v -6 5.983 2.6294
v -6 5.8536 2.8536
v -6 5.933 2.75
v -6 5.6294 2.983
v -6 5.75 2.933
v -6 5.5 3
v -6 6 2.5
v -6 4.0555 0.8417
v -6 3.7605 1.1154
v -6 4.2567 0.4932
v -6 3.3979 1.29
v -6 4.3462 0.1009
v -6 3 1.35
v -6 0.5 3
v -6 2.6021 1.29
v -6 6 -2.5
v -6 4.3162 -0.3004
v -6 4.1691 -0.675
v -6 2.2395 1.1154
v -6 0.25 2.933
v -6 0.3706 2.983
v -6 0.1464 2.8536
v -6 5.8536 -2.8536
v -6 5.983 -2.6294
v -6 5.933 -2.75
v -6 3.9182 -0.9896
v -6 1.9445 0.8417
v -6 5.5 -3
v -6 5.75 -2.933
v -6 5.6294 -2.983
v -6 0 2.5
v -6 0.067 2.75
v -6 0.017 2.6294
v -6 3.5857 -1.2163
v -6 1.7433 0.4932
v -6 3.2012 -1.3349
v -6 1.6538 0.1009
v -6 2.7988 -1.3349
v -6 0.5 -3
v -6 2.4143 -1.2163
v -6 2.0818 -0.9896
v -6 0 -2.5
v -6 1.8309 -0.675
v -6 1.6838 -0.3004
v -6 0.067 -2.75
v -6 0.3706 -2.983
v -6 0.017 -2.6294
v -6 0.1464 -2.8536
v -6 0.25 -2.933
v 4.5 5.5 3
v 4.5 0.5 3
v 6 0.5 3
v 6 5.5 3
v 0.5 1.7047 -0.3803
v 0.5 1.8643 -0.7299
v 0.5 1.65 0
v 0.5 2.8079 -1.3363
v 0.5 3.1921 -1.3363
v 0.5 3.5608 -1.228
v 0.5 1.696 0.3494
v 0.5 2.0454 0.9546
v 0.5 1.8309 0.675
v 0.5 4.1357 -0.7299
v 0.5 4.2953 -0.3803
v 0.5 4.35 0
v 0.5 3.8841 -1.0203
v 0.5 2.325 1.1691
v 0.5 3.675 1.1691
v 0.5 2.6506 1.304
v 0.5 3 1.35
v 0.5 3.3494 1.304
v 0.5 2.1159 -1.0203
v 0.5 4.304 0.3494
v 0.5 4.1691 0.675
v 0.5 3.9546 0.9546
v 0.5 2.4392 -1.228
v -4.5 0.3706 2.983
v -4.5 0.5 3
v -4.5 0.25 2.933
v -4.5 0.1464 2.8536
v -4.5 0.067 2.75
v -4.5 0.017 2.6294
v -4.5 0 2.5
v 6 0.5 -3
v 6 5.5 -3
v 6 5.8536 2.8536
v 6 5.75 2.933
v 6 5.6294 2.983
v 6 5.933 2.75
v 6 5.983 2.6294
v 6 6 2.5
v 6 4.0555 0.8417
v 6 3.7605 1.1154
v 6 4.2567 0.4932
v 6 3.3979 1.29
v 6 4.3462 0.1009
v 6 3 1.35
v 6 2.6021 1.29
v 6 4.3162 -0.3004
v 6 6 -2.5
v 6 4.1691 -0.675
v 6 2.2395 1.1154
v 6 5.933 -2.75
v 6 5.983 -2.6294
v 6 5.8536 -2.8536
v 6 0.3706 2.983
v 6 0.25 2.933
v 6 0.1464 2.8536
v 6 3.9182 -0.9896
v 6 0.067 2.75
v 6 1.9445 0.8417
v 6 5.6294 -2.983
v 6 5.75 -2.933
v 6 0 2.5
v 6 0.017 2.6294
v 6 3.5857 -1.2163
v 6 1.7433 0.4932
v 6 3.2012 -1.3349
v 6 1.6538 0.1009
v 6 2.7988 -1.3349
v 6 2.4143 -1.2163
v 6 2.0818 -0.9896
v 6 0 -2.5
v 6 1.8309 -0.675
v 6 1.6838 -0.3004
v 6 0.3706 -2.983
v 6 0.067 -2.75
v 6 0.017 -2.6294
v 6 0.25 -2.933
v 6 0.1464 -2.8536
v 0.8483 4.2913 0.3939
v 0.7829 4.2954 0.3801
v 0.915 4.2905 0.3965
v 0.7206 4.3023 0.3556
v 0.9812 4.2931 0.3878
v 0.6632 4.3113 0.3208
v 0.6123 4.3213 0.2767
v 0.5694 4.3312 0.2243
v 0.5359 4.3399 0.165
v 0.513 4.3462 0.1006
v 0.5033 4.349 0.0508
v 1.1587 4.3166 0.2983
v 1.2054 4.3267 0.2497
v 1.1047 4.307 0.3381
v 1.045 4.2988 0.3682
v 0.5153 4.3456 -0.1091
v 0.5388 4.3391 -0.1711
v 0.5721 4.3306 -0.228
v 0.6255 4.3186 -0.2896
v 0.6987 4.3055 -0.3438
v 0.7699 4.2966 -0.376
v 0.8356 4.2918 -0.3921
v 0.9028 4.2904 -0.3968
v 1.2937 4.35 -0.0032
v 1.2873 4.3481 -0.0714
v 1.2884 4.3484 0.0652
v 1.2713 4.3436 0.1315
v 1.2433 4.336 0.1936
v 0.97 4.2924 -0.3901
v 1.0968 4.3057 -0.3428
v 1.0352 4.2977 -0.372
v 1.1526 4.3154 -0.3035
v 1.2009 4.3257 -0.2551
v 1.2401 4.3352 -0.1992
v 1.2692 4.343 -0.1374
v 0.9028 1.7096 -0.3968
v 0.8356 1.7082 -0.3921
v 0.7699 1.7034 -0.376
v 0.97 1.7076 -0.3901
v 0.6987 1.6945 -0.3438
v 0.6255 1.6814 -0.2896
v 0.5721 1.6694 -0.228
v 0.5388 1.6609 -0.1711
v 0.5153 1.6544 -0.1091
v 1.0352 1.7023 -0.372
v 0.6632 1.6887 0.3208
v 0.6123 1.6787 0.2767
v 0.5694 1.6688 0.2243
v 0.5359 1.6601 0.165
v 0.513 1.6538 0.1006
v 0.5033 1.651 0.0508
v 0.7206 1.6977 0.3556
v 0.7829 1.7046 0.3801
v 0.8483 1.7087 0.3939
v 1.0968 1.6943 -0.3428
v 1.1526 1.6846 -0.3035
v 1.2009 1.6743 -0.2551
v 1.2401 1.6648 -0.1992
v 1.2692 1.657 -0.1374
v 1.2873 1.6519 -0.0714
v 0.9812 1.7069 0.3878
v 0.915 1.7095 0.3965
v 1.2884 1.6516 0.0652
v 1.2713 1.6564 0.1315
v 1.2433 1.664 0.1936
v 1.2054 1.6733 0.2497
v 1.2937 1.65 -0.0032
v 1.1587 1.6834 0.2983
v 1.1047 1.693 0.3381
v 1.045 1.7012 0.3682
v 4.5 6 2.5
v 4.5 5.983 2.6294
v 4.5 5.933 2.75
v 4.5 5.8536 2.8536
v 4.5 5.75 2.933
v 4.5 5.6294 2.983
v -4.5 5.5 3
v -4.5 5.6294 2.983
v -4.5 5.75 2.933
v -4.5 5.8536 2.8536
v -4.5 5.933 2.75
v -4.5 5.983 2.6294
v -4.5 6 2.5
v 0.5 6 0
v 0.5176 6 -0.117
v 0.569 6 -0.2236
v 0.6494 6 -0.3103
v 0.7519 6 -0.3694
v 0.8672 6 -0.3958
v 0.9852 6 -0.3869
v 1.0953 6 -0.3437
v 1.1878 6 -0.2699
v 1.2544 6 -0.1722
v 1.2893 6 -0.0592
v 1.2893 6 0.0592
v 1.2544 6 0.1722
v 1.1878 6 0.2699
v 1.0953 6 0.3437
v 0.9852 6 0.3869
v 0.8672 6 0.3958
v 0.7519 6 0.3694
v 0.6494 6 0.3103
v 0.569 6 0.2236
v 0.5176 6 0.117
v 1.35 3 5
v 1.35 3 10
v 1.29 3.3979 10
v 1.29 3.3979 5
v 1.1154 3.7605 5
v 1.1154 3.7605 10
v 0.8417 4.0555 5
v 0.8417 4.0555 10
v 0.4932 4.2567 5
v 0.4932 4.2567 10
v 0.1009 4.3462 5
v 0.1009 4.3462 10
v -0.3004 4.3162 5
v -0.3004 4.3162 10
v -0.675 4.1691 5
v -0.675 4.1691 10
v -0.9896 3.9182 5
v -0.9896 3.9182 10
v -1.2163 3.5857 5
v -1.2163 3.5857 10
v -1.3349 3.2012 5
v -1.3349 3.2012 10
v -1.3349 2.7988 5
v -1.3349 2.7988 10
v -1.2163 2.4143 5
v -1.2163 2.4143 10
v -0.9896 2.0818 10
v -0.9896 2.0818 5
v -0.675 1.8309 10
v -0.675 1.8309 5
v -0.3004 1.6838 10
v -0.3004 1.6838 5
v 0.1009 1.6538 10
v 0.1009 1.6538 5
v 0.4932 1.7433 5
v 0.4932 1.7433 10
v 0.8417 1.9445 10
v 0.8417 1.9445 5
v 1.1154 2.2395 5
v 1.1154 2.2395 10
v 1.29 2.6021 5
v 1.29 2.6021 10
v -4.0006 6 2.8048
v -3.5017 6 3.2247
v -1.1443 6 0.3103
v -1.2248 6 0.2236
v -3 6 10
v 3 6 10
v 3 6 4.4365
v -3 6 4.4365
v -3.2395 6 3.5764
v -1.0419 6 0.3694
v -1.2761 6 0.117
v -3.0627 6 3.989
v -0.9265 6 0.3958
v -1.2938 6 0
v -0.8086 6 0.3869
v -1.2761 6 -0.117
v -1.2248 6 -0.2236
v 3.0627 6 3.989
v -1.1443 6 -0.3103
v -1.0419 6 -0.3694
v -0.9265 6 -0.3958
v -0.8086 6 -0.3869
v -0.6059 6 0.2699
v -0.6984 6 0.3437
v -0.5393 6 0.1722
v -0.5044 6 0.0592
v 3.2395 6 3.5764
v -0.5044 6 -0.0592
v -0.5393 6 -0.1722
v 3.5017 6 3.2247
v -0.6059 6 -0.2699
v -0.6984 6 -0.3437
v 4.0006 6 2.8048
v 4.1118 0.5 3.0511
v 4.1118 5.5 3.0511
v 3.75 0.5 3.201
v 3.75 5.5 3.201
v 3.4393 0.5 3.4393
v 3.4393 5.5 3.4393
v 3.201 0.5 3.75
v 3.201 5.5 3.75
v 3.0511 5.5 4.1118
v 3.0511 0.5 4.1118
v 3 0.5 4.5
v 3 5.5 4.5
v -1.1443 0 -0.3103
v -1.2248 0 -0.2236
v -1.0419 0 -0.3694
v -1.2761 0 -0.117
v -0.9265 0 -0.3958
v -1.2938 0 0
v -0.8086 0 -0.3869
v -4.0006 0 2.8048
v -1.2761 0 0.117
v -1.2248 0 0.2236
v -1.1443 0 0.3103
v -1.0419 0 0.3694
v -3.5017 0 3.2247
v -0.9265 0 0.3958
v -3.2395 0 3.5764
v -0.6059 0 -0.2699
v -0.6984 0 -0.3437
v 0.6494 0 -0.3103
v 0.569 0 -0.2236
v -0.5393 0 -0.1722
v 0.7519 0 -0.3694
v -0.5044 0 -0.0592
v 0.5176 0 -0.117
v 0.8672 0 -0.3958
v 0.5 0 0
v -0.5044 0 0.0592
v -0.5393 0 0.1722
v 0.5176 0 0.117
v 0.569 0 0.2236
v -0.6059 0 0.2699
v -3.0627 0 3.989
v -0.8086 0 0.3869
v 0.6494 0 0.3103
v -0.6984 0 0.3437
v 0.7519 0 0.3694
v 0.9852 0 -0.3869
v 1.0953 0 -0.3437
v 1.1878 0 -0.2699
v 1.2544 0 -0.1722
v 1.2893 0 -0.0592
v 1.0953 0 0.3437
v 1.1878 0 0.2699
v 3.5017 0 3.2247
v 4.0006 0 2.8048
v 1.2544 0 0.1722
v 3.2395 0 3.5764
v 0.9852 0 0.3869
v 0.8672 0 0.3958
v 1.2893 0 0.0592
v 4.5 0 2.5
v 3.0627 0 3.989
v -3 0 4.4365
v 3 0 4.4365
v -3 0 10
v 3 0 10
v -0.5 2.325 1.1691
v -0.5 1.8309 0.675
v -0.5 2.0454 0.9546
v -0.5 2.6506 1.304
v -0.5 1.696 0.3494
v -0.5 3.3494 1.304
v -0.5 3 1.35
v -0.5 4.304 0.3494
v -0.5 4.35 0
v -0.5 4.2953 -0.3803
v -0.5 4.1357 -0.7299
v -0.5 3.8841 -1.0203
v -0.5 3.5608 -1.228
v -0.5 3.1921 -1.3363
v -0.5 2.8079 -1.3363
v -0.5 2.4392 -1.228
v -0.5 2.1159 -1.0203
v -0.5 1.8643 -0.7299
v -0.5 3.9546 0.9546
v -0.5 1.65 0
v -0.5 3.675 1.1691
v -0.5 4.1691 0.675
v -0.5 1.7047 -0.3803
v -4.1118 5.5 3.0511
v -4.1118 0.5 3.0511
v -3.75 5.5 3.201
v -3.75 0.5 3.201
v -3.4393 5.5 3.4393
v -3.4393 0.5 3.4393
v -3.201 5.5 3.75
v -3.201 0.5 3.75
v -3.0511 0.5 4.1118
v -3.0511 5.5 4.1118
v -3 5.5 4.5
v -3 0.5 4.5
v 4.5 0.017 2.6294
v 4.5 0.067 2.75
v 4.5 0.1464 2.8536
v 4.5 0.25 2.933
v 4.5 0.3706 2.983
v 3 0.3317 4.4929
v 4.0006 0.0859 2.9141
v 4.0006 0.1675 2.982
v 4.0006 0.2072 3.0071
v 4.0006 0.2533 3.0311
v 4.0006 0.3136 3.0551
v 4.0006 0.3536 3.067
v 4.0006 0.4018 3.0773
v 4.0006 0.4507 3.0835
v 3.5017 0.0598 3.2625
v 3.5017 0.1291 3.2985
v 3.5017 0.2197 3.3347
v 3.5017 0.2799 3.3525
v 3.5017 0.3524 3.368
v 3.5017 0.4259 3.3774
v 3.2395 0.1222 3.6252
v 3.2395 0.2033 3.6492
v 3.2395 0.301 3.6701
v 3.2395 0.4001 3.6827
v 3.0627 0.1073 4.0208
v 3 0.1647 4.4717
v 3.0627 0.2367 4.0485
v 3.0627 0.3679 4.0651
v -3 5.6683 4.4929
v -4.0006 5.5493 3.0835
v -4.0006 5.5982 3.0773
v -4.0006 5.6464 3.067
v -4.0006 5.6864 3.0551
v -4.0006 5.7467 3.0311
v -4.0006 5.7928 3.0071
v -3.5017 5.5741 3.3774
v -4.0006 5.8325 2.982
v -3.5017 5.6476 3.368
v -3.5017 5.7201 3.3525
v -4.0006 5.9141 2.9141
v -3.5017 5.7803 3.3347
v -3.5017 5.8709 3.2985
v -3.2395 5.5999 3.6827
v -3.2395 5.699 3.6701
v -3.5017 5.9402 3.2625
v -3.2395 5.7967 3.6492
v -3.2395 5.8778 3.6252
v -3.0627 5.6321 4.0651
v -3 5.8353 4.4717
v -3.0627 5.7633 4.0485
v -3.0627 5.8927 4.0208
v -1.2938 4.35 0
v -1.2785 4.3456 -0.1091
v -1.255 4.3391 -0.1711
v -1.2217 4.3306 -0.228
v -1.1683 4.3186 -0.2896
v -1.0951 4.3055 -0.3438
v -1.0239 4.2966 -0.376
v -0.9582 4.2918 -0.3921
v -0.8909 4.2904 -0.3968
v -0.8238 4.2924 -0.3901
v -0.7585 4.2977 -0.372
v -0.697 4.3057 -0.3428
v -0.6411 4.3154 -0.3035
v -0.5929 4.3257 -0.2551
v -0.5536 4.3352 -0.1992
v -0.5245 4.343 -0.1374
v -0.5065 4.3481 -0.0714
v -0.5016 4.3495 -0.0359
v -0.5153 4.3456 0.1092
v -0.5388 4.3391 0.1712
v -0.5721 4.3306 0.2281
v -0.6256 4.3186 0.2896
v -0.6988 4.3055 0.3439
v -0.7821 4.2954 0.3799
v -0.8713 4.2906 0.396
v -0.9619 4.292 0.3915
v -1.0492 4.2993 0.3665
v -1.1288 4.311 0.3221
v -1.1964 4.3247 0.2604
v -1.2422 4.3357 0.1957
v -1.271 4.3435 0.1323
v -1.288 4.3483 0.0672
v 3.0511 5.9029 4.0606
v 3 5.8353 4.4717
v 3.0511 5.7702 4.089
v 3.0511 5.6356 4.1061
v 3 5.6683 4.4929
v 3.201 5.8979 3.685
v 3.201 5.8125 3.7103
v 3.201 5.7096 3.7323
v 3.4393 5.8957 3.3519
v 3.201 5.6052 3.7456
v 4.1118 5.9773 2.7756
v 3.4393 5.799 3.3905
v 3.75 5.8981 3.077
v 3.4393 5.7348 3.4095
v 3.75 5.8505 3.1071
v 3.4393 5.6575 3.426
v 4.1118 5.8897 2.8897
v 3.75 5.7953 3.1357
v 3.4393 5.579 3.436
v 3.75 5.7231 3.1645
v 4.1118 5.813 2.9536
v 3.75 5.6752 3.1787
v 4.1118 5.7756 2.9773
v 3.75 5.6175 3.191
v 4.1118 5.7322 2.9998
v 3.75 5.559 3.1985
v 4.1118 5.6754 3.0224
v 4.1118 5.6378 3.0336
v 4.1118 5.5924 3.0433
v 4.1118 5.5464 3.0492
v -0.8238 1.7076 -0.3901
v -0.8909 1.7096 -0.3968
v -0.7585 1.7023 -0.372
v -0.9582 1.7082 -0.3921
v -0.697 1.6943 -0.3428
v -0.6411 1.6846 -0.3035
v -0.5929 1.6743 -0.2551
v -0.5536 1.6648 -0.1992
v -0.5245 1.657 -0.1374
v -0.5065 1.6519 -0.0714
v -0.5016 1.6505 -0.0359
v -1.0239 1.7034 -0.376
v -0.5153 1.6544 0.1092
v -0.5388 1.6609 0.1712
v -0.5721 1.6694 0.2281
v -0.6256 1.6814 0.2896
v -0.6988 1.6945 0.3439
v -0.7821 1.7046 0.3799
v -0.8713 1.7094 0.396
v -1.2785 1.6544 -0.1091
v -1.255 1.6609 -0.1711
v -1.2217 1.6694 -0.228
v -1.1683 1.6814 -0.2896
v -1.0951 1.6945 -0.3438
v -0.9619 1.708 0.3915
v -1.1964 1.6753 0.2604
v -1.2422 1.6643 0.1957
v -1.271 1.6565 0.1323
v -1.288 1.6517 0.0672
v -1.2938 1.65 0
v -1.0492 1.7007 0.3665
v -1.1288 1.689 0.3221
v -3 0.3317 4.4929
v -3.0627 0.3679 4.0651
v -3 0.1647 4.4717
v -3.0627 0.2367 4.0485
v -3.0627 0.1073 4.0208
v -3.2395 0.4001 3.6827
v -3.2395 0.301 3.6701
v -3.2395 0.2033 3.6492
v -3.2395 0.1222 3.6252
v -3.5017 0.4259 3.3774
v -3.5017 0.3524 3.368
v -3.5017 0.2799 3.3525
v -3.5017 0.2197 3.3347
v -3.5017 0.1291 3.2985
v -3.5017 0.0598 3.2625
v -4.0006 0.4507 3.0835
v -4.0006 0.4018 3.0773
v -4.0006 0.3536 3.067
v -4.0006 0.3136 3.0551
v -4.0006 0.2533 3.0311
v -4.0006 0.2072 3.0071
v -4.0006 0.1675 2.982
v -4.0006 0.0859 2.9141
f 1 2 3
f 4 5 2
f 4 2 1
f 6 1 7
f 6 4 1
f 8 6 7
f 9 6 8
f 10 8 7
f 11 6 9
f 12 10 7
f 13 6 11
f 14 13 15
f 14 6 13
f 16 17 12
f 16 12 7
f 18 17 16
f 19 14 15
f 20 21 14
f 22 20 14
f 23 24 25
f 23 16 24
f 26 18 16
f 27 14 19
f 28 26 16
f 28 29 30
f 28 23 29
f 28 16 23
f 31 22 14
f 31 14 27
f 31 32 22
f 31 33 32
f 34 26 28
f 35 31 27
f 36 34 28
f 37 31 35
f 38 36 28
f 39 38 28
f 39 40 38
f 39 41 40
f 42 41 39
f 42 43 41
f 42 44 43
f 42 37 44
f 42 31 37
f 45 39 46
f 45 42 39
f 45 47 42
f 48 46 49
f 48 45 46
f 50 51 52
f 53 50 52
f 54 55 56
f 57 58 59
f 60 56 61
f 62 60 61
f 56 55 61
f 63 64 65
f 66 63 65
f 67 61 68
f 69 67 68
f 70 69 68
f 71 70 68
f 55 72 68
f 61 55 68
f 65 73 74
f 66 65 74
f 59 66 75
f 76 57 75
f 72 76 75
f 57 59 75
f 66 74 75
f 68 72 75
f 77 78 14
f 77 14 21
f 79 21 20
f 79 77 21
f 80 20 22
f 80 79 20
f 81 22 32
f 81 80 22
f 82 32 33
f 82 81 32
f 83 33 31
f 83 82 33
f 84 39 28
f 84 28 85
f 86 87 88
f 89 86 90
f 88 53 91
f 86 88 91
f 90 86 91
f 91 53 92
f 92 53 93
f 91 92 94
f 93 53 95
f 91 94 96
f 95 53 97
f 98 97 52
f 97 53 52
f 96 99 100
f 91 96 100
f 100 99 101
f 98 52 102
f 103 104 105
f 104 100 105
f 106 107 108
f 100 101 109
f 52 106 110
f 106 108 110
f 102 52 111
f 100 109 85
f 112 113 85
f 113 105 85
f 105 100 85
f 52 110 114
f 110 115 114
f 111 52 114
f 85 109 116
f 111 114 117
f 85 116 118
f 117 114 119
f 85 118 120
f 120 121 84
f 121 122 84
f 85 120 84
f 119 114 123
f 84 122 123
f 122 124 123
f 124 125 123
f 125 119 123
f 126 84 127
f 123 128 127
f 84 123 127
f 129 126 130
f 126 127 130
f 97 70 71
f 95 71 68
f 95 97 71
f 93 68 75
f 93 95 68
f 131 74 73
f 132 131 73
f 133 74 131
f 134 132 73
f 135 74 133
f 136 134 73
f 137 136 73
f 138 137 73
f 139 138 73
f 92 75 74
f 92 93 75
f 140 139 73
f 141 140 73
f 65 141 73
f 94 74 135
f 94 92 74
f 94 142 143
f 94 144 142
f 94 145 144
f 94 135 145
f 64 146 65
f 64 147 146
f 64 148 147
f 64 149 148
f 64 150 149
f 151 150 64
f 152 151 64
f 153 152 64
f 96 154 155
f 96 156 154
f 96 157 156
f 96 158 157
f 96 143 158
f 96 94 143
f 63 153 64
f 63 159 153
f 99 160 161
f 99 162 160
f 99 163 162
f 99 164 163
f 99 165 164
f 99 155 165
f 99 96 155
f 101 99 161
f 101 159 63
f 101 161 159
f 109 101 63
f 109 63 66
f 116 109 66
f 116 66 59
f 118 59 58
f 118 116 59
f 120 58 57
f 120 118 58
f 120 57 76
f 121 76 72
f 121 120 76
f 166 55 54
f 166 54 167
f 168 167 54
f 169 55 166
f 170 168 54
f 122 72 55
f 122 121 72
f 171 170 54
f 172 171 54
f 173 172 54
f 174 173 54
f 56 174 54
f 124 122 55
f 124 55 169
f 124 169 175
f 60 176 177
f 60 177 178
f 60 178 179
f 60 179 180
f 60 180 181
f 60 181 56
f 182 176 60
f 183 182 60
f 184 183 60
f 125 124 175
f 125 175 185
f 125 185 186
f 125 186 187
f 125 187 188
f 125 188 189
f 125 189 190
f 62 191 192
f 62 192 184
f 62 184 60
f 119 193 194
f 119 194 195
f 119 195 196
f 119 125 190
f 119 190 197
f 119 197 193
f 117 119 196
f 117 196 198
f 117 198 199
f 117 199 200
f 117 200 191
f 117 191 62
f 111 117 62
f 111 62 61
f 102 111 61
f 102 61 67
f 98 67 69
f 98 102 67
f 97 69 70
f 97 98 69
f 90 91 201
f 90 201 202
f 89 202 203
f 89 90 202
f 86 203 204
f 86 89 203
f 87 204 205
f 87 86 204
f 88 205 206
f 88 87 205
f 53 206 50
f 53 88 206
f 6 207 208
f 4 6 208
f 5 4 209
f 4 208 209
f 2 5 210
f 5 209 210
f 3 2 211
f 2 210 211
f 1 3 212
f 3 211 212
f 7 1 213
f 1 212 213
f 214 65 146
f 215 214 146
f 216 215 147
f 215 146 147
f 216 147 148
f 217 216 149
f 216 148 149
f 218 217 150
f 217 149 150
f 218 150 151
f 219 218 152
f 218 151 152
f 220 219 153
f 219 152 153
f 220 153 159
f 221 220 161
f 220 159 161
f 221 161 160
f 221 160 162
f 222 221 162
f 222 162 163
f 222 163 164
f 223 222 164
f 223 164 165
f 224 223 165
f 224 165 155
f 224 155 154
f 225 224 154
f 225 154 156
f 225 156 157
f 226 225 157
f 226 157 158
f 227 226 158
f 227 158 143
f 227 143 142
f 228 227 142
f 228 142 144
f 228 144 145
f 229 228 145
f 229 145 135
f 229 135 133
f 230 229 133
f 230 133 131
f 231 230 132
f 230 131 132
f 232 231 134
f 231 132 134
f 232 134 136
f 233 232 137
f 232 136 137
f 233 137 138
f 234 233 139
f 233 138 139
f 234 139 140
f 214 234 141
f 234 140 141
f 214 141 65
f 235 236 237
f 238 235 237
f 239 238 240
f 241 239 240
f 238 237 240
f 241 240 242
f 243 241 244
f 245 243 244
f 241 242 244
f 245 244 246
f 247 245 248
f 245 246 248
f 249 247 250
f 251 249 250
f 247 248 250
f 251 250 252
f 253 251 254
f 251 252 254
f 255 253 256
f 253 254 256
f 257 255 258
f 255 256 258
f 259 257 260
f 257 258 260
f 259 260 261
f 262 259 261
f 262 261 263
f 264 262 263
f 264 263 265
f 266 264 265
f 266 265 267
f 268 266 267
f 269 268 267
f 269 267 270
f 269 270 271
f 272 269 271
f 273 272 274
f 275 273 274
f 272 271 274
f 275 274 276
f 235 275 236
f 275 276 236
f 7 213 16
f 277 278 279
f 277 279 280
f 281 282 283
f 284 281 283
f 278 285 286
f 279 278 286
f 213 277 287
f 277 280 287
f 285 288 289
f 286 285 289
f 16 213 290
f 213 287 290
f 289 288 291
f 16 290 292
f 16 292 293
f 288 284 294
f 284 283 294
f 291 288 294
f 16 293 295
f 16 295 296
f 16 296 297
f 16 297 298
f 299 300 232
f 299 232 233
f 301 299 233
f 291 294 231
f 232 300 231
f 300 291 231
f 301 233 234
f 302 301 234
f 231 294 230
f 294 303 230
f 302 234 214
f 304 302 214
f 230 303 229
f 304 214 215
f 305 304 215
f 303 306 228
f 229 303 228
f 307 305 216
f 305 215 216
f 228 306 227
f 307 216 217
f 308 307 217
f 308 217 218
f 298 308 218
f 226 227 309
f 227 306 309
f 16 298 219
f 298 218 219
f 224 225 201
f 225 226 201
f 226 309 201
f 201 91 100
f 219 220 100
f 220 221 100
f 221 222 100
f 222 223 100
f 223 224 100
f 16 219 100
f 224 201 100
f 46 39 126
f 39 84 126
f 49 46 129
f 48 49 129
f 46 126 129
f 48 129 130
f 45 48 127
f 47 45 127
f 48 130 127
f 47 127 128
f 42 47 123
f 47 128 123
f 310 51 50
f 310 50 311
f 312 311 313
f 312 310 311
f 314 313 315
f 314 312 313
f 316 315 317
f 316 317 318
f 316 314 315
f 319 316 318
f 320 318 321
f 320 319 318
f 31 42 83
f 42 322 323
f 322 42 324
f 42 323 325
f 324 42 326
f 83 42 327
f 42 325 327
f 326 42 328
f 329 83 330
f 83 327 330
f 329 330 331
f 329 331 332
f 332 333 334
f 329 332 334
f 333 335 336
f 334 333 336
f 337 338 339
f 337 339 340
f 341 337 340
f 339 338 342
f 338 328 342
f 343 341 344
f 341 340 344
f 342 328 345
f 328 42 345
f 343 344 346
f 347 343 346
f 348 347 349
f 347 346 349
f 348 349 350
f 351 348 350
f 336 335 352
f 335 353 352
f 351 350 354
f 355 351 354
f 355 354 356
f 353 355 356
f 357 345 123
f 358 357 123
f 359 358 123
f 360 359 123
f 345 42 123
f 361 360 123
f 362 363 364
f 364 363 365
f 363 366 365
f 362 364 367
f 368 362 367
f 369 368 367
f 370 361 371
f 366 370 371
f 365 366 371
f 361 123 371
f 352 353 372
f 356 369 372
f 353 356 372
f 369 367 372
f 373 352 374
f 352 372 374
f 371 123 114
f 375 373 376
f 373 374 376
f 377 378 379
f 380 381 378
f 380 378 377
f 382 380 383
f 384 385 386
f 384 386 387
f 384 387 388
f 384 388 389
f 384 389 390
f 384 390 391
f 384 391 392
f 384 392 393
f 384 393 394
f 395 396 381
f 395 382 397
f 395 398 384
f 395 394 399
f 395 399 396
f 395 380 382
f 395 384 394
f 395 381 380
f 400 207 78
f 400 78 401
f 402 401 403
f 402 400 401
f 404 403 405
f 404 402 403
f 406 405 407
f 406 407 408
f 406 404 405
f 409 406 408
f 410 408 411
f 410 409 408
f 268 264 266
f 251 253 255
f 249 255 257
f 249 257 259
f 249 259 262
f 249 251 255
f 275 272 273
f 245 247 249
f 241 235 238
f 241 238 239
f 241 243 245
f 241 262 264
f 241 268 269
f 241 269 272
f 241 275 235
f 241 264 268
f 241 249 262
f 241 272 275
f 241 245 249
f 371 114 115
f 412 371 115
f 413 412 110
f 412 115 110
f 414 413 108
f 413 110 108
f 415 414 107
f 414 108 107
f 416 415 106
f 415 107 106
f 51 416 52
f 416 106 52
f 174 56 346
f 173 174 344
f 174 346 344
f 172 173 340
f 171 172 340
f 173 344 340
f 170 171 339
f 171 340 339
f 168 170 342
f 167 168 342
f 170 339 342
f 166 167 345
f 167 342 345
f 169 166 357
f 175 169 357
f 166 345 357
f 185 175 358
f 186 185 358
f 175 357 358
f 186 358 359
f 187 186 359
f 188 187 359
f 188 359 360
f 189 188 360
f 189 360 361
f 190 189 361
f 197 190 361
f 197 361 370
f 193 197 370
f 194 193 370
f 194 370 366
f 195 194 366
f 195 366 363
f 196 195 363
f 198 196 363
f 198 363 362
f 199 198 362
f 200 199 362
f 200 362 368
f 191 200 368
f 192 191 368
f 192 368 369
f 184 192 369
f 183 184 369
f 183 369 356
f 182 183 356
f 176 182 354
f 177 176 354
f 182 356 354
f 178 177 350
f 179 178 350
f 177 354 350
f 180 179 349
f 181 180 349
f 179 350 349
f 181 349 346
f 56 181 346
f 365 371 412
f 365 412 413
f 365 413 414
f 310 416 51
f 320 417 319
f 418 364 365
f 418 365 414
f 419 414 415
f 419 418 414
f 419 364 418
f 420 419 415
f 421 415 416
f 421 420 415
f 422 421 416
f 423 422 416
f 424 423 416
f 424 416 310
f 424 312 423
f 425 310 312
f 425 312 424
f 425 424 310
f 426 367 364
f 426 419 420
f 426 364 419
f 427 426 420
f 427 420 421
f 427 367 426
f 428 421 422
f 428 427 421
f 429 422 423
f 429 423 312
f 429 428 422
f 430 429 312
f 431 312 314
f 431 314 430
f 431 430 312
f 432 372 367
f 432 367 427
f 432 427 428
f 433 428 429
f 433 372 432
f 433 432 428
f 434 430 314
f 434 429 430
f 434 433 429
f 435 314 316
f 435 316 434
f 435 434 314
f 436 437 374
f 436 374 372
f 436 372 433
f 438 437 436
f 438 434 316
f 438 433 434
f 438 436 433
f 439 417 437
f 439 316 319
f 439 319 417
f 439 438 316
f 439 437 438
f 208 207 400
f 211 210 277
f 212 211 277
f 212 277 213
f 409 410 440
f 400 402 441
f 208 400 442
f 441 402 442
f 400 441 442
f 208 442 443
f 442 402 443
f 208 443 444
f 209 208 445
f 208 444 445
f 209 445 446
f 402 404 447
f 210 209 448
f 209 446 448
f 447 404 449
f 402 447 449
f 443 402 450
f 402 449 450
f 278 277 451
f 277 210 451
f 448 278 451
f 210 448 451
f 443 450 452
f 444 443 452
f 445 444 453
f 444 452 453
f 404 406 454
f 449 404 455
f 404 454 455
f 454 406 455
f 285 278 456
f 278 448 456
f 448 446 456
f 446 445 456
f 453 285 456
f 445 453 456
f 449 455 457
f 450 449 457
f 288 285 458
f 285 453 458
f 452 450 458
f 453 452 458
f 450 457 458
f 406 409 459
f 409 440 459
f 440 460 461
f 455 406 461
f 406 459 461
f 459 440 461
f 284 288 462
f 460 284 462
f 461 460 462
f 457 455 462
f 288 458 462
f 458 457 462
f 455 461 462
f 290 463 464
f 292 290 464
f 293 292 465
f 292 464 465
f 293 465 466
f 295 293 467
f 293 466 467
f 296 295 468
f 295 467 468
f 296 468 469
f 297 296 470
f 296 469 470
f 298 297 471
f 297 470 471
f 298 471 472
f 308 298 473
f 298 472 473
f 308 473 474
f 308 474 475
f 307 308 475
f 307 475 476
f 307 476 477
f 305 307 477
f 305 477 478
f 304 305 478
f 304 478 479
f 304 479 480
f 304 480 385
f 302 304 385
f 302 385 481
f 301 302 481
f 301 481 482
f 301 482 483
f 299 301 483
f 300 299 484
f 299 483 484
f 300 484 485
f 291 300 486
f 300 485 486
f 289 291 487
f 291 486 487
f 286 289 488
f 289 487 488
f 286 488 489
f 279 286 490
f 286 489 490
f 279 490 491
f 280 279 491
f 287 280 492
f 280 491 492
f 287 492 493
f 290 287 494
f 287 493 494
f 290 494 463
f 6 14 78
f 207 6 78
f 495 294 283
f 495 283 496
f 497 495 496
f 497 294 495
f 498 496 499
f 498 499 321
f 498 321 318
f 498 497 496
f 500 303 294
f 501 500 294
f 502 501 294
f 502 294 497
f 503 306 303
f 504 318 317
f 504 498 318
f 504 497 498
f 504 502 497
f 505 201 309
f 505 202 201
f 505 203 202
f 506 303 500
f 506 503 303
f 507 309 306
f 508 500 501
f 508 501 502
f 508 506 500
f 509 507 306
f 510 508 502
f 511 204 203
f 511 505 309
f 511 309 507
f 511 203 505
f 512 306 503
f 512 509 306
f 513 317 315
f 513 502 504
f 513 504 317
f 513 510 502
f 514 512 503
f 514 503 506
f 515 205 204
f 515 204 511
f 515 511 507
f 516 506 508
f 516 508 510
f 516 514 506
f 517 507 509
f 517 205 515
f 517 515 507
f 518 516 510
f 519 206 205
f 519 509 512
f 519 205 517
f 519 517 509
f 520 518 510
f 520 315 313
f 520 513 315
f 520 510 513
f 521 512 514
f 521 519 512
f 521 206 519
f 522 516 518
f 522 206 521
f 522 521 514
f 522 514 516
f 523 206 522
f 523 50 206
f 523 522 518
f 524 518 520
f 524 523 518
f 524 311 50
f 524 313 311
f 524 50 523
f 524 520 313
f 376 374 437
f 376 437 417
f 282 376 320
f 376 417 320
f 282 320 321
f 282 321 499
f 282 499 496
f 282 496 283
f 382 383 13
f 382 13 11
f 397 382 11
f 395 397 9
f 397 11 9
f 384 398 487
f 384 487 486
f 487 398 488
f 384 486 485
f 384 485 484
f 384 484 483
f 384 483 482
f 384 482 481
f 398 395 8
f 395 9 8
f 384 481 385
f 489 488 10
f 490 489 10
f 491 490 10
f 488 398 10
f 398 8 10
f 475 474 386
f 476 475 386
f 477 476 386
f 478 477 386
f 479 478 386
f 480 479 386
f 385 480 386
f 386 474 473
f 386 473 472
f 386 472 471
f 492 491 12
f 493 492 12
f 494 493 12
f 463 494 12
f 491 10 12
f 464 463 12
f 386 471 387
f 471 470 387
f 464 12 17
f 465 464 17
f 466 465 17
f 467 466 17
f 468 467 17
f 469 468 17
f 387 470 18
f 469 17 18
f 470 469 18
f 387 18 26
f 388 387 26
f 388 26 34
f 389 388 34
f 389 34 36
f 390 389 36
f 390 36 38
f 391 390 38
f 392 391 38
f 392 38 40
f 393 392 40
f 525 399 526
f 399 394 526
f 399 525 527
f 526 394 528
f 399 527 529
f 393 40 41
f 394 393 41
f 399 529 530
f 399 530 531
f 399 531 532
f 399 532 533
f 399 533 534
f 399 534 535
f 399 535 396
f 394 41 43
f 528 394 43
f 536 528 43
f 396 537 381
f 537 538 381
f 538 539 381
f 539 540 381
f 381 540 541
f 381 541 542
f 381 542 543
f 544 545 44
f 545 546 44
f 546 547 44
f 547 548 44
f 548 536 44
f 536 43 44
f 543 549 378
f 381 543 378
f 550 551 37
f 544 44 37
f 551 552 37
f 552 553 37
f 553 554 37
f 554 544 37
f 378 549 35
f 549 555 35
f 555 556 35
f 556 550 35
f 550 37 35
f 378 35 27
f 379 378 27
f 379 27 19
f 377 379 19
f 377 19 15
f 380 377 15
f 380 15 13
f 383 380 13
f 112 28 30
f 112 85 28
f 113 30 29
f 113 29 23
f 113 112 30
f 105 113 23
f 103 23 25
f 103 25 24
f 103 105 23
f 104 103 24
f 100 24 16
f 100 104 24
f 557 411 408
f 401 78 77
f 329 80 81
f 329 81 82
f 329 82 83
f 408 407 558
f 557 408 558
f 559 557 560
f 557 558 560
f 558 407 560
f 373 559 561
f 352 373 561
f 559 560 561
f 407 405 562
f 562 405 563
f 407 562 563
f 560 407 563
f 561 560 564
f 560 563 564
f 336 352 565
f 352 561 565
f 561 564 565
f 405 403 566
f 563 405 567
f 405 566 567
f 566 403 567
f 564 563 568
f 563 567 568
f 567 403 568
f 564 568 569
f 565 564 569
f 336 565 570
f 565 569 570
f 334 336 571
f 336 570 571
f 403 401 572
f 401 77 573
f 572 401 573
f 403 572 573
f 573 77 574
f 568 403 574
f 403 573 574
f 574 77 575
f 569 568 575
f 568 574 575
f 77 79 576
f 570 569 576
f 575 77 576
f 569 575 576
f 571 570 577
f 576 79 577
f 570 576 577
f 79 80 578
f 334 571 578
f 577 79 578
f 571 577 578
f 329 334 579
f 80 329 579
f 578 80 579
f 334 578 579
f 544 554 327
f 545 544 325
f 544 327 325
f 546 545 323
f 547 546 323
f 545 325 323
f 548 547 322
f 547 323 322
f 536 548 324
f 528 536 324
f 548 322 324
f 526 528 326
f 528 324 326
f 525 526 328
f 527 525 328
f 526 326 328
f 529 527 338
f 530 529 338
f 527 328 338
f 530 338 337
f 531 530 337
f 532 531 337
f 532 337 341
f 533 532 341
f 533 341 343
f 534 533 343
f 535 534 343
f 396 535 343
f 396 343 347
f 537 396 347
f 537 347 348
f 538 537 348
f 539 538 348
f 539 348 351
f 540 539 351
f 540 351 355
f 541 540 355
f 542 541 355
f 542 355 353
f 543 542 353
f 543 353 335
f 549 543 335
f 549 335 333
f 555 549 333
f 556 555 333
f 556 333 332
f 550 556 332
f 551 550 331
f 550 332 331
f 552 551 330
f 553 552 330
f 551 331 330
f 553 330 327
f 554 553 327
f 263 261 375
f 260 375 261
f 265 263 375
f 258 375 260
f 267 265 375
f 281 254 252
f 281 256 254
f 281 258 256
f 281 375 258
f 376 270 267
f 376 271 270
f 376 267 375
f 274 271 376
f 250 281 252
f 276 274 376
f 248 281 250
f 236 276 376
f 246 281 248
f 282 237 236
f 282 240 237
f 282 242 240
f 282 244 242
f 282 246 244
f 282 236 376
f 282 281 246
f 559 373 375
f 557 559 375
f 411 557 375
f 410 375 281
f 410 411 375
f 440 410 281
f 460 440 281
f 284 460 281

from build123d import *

# Parameters (mm, degrees)
SKETCH1_W                       = 12
SKETCH1_H                       = 6
BOSS_EXTRUDE1_DEPTH             = 6
F_1_32_0_03125_DIAMETER_HOLE1_D = 0.79375
SKETCH15_W                      = 6
SKETCH15_H                      = 6
BOSS_EXTRUDE2_DEPTH             = 7
FILLET4_R                       = 0.5
FILLET3_R                       = 1.5
SKETCH19_R                      = 1.35
CUT_EXTRUDE1_DEPTH              = 5.5
SKETCH16_R                      = 1.35
CUT_EXTRUDE2_DEPTH              = 5


with BuildPart() as part:
    # Sketch1 → Boss-Extrude1 (new body)
    with BuildSketch(Plane(origin=(0, 0, 0), x_dir=(1, 0, 0), z_dir=(0, 1, 0))):
        Rectangle(SKETCH1_W, SKETCH1_H)
    extrude(amount=BOSS_EXTRUDE1_DEPTH)

    # 1/32 (0.03125) Diameter Hole1 (through all)
    with Locations(Plane(origin=(0, 6, 0), x_dir=(1, 0, 0), z_dir=(0, 1, 0))):
        with Locations((0.896875, 0), (-0.896875, 0)):
            Hole(F_1_32_0_03125_DIAMETER_HOLE1_D / 2)

    # Sketch15 → Boss-Extrude2 (add)
    with BuildSketch(Plane.XY.offset(3)):
        with Locations((0, 3)):
            Rectangle(SKETCH15_W, SKETCH15_H)
    extrude(amount=BOSS_EXTRUDE2_DEPTH)

    # Fillet4
    fillet4_edges = [part.edges().sort_by_distance(p)[0] for p in [
        (4.5, 6, 3),
        (4.5, 0, 3),
        (-4.5, 0, 3),
        (0, 0, -3),
        (0, 6, -3),
        (-4.5, 6, 3),
    ]]
    fillet(fillet4_edges, radius=FILLET4_R)

    # Fillet3
    fillet3_edges = [part.edges().sort_by_distance(p)[0] for p in [
        (-3, 3, 3),
        (-3, 0.146446609, 2.853553391),
        (-3, 5.853553391, 2.853553391),
    ]]
    fillet(fillet3_edges, radius=FILLET3_R)
    fillet3_2_edges = [part.edges().sort_by_distance(p)[0] for p in [
        (3, 5.853553391, 2.853553391),
        (3, 3, 3),
        (3, 0.146446609, 2.853553391),
    ]]
    fillet(fillet3_2_edges, radius=FILLET3_R)

    # Sketch19 → Cut-Extrude1 (cut)
    with BuildSketch(Plane.ZY.offset(6)):
        with Locations((0, 3)):
            Circle(SKETCH19_R)
    cut_extrude1 = extrude(amount=-CUT_EXTRUDE1_DEPTH, mode=Mode.SUBTRACT)

    # Sketch16 → Cut-Extrude2 (cut)
    with BuildSketch(Plane.XY.offset(10)):
        with Locations((0, 3)):
            Circle(SKETCH16_R)
    extrude(amount=-CUT_EXTRUDE2_DEPTH, mode=Mode.SUBTRACT)

    # Mirror2: Cut-Extrude1 across plane
    add(cut_extrude1.mirror(Plane(origin=(0, 0, 0), x_dir=(0, 0, 1), z_dir=(1, 0, 0))), mode=Mode.SUBTRACT)


solid = part.part
